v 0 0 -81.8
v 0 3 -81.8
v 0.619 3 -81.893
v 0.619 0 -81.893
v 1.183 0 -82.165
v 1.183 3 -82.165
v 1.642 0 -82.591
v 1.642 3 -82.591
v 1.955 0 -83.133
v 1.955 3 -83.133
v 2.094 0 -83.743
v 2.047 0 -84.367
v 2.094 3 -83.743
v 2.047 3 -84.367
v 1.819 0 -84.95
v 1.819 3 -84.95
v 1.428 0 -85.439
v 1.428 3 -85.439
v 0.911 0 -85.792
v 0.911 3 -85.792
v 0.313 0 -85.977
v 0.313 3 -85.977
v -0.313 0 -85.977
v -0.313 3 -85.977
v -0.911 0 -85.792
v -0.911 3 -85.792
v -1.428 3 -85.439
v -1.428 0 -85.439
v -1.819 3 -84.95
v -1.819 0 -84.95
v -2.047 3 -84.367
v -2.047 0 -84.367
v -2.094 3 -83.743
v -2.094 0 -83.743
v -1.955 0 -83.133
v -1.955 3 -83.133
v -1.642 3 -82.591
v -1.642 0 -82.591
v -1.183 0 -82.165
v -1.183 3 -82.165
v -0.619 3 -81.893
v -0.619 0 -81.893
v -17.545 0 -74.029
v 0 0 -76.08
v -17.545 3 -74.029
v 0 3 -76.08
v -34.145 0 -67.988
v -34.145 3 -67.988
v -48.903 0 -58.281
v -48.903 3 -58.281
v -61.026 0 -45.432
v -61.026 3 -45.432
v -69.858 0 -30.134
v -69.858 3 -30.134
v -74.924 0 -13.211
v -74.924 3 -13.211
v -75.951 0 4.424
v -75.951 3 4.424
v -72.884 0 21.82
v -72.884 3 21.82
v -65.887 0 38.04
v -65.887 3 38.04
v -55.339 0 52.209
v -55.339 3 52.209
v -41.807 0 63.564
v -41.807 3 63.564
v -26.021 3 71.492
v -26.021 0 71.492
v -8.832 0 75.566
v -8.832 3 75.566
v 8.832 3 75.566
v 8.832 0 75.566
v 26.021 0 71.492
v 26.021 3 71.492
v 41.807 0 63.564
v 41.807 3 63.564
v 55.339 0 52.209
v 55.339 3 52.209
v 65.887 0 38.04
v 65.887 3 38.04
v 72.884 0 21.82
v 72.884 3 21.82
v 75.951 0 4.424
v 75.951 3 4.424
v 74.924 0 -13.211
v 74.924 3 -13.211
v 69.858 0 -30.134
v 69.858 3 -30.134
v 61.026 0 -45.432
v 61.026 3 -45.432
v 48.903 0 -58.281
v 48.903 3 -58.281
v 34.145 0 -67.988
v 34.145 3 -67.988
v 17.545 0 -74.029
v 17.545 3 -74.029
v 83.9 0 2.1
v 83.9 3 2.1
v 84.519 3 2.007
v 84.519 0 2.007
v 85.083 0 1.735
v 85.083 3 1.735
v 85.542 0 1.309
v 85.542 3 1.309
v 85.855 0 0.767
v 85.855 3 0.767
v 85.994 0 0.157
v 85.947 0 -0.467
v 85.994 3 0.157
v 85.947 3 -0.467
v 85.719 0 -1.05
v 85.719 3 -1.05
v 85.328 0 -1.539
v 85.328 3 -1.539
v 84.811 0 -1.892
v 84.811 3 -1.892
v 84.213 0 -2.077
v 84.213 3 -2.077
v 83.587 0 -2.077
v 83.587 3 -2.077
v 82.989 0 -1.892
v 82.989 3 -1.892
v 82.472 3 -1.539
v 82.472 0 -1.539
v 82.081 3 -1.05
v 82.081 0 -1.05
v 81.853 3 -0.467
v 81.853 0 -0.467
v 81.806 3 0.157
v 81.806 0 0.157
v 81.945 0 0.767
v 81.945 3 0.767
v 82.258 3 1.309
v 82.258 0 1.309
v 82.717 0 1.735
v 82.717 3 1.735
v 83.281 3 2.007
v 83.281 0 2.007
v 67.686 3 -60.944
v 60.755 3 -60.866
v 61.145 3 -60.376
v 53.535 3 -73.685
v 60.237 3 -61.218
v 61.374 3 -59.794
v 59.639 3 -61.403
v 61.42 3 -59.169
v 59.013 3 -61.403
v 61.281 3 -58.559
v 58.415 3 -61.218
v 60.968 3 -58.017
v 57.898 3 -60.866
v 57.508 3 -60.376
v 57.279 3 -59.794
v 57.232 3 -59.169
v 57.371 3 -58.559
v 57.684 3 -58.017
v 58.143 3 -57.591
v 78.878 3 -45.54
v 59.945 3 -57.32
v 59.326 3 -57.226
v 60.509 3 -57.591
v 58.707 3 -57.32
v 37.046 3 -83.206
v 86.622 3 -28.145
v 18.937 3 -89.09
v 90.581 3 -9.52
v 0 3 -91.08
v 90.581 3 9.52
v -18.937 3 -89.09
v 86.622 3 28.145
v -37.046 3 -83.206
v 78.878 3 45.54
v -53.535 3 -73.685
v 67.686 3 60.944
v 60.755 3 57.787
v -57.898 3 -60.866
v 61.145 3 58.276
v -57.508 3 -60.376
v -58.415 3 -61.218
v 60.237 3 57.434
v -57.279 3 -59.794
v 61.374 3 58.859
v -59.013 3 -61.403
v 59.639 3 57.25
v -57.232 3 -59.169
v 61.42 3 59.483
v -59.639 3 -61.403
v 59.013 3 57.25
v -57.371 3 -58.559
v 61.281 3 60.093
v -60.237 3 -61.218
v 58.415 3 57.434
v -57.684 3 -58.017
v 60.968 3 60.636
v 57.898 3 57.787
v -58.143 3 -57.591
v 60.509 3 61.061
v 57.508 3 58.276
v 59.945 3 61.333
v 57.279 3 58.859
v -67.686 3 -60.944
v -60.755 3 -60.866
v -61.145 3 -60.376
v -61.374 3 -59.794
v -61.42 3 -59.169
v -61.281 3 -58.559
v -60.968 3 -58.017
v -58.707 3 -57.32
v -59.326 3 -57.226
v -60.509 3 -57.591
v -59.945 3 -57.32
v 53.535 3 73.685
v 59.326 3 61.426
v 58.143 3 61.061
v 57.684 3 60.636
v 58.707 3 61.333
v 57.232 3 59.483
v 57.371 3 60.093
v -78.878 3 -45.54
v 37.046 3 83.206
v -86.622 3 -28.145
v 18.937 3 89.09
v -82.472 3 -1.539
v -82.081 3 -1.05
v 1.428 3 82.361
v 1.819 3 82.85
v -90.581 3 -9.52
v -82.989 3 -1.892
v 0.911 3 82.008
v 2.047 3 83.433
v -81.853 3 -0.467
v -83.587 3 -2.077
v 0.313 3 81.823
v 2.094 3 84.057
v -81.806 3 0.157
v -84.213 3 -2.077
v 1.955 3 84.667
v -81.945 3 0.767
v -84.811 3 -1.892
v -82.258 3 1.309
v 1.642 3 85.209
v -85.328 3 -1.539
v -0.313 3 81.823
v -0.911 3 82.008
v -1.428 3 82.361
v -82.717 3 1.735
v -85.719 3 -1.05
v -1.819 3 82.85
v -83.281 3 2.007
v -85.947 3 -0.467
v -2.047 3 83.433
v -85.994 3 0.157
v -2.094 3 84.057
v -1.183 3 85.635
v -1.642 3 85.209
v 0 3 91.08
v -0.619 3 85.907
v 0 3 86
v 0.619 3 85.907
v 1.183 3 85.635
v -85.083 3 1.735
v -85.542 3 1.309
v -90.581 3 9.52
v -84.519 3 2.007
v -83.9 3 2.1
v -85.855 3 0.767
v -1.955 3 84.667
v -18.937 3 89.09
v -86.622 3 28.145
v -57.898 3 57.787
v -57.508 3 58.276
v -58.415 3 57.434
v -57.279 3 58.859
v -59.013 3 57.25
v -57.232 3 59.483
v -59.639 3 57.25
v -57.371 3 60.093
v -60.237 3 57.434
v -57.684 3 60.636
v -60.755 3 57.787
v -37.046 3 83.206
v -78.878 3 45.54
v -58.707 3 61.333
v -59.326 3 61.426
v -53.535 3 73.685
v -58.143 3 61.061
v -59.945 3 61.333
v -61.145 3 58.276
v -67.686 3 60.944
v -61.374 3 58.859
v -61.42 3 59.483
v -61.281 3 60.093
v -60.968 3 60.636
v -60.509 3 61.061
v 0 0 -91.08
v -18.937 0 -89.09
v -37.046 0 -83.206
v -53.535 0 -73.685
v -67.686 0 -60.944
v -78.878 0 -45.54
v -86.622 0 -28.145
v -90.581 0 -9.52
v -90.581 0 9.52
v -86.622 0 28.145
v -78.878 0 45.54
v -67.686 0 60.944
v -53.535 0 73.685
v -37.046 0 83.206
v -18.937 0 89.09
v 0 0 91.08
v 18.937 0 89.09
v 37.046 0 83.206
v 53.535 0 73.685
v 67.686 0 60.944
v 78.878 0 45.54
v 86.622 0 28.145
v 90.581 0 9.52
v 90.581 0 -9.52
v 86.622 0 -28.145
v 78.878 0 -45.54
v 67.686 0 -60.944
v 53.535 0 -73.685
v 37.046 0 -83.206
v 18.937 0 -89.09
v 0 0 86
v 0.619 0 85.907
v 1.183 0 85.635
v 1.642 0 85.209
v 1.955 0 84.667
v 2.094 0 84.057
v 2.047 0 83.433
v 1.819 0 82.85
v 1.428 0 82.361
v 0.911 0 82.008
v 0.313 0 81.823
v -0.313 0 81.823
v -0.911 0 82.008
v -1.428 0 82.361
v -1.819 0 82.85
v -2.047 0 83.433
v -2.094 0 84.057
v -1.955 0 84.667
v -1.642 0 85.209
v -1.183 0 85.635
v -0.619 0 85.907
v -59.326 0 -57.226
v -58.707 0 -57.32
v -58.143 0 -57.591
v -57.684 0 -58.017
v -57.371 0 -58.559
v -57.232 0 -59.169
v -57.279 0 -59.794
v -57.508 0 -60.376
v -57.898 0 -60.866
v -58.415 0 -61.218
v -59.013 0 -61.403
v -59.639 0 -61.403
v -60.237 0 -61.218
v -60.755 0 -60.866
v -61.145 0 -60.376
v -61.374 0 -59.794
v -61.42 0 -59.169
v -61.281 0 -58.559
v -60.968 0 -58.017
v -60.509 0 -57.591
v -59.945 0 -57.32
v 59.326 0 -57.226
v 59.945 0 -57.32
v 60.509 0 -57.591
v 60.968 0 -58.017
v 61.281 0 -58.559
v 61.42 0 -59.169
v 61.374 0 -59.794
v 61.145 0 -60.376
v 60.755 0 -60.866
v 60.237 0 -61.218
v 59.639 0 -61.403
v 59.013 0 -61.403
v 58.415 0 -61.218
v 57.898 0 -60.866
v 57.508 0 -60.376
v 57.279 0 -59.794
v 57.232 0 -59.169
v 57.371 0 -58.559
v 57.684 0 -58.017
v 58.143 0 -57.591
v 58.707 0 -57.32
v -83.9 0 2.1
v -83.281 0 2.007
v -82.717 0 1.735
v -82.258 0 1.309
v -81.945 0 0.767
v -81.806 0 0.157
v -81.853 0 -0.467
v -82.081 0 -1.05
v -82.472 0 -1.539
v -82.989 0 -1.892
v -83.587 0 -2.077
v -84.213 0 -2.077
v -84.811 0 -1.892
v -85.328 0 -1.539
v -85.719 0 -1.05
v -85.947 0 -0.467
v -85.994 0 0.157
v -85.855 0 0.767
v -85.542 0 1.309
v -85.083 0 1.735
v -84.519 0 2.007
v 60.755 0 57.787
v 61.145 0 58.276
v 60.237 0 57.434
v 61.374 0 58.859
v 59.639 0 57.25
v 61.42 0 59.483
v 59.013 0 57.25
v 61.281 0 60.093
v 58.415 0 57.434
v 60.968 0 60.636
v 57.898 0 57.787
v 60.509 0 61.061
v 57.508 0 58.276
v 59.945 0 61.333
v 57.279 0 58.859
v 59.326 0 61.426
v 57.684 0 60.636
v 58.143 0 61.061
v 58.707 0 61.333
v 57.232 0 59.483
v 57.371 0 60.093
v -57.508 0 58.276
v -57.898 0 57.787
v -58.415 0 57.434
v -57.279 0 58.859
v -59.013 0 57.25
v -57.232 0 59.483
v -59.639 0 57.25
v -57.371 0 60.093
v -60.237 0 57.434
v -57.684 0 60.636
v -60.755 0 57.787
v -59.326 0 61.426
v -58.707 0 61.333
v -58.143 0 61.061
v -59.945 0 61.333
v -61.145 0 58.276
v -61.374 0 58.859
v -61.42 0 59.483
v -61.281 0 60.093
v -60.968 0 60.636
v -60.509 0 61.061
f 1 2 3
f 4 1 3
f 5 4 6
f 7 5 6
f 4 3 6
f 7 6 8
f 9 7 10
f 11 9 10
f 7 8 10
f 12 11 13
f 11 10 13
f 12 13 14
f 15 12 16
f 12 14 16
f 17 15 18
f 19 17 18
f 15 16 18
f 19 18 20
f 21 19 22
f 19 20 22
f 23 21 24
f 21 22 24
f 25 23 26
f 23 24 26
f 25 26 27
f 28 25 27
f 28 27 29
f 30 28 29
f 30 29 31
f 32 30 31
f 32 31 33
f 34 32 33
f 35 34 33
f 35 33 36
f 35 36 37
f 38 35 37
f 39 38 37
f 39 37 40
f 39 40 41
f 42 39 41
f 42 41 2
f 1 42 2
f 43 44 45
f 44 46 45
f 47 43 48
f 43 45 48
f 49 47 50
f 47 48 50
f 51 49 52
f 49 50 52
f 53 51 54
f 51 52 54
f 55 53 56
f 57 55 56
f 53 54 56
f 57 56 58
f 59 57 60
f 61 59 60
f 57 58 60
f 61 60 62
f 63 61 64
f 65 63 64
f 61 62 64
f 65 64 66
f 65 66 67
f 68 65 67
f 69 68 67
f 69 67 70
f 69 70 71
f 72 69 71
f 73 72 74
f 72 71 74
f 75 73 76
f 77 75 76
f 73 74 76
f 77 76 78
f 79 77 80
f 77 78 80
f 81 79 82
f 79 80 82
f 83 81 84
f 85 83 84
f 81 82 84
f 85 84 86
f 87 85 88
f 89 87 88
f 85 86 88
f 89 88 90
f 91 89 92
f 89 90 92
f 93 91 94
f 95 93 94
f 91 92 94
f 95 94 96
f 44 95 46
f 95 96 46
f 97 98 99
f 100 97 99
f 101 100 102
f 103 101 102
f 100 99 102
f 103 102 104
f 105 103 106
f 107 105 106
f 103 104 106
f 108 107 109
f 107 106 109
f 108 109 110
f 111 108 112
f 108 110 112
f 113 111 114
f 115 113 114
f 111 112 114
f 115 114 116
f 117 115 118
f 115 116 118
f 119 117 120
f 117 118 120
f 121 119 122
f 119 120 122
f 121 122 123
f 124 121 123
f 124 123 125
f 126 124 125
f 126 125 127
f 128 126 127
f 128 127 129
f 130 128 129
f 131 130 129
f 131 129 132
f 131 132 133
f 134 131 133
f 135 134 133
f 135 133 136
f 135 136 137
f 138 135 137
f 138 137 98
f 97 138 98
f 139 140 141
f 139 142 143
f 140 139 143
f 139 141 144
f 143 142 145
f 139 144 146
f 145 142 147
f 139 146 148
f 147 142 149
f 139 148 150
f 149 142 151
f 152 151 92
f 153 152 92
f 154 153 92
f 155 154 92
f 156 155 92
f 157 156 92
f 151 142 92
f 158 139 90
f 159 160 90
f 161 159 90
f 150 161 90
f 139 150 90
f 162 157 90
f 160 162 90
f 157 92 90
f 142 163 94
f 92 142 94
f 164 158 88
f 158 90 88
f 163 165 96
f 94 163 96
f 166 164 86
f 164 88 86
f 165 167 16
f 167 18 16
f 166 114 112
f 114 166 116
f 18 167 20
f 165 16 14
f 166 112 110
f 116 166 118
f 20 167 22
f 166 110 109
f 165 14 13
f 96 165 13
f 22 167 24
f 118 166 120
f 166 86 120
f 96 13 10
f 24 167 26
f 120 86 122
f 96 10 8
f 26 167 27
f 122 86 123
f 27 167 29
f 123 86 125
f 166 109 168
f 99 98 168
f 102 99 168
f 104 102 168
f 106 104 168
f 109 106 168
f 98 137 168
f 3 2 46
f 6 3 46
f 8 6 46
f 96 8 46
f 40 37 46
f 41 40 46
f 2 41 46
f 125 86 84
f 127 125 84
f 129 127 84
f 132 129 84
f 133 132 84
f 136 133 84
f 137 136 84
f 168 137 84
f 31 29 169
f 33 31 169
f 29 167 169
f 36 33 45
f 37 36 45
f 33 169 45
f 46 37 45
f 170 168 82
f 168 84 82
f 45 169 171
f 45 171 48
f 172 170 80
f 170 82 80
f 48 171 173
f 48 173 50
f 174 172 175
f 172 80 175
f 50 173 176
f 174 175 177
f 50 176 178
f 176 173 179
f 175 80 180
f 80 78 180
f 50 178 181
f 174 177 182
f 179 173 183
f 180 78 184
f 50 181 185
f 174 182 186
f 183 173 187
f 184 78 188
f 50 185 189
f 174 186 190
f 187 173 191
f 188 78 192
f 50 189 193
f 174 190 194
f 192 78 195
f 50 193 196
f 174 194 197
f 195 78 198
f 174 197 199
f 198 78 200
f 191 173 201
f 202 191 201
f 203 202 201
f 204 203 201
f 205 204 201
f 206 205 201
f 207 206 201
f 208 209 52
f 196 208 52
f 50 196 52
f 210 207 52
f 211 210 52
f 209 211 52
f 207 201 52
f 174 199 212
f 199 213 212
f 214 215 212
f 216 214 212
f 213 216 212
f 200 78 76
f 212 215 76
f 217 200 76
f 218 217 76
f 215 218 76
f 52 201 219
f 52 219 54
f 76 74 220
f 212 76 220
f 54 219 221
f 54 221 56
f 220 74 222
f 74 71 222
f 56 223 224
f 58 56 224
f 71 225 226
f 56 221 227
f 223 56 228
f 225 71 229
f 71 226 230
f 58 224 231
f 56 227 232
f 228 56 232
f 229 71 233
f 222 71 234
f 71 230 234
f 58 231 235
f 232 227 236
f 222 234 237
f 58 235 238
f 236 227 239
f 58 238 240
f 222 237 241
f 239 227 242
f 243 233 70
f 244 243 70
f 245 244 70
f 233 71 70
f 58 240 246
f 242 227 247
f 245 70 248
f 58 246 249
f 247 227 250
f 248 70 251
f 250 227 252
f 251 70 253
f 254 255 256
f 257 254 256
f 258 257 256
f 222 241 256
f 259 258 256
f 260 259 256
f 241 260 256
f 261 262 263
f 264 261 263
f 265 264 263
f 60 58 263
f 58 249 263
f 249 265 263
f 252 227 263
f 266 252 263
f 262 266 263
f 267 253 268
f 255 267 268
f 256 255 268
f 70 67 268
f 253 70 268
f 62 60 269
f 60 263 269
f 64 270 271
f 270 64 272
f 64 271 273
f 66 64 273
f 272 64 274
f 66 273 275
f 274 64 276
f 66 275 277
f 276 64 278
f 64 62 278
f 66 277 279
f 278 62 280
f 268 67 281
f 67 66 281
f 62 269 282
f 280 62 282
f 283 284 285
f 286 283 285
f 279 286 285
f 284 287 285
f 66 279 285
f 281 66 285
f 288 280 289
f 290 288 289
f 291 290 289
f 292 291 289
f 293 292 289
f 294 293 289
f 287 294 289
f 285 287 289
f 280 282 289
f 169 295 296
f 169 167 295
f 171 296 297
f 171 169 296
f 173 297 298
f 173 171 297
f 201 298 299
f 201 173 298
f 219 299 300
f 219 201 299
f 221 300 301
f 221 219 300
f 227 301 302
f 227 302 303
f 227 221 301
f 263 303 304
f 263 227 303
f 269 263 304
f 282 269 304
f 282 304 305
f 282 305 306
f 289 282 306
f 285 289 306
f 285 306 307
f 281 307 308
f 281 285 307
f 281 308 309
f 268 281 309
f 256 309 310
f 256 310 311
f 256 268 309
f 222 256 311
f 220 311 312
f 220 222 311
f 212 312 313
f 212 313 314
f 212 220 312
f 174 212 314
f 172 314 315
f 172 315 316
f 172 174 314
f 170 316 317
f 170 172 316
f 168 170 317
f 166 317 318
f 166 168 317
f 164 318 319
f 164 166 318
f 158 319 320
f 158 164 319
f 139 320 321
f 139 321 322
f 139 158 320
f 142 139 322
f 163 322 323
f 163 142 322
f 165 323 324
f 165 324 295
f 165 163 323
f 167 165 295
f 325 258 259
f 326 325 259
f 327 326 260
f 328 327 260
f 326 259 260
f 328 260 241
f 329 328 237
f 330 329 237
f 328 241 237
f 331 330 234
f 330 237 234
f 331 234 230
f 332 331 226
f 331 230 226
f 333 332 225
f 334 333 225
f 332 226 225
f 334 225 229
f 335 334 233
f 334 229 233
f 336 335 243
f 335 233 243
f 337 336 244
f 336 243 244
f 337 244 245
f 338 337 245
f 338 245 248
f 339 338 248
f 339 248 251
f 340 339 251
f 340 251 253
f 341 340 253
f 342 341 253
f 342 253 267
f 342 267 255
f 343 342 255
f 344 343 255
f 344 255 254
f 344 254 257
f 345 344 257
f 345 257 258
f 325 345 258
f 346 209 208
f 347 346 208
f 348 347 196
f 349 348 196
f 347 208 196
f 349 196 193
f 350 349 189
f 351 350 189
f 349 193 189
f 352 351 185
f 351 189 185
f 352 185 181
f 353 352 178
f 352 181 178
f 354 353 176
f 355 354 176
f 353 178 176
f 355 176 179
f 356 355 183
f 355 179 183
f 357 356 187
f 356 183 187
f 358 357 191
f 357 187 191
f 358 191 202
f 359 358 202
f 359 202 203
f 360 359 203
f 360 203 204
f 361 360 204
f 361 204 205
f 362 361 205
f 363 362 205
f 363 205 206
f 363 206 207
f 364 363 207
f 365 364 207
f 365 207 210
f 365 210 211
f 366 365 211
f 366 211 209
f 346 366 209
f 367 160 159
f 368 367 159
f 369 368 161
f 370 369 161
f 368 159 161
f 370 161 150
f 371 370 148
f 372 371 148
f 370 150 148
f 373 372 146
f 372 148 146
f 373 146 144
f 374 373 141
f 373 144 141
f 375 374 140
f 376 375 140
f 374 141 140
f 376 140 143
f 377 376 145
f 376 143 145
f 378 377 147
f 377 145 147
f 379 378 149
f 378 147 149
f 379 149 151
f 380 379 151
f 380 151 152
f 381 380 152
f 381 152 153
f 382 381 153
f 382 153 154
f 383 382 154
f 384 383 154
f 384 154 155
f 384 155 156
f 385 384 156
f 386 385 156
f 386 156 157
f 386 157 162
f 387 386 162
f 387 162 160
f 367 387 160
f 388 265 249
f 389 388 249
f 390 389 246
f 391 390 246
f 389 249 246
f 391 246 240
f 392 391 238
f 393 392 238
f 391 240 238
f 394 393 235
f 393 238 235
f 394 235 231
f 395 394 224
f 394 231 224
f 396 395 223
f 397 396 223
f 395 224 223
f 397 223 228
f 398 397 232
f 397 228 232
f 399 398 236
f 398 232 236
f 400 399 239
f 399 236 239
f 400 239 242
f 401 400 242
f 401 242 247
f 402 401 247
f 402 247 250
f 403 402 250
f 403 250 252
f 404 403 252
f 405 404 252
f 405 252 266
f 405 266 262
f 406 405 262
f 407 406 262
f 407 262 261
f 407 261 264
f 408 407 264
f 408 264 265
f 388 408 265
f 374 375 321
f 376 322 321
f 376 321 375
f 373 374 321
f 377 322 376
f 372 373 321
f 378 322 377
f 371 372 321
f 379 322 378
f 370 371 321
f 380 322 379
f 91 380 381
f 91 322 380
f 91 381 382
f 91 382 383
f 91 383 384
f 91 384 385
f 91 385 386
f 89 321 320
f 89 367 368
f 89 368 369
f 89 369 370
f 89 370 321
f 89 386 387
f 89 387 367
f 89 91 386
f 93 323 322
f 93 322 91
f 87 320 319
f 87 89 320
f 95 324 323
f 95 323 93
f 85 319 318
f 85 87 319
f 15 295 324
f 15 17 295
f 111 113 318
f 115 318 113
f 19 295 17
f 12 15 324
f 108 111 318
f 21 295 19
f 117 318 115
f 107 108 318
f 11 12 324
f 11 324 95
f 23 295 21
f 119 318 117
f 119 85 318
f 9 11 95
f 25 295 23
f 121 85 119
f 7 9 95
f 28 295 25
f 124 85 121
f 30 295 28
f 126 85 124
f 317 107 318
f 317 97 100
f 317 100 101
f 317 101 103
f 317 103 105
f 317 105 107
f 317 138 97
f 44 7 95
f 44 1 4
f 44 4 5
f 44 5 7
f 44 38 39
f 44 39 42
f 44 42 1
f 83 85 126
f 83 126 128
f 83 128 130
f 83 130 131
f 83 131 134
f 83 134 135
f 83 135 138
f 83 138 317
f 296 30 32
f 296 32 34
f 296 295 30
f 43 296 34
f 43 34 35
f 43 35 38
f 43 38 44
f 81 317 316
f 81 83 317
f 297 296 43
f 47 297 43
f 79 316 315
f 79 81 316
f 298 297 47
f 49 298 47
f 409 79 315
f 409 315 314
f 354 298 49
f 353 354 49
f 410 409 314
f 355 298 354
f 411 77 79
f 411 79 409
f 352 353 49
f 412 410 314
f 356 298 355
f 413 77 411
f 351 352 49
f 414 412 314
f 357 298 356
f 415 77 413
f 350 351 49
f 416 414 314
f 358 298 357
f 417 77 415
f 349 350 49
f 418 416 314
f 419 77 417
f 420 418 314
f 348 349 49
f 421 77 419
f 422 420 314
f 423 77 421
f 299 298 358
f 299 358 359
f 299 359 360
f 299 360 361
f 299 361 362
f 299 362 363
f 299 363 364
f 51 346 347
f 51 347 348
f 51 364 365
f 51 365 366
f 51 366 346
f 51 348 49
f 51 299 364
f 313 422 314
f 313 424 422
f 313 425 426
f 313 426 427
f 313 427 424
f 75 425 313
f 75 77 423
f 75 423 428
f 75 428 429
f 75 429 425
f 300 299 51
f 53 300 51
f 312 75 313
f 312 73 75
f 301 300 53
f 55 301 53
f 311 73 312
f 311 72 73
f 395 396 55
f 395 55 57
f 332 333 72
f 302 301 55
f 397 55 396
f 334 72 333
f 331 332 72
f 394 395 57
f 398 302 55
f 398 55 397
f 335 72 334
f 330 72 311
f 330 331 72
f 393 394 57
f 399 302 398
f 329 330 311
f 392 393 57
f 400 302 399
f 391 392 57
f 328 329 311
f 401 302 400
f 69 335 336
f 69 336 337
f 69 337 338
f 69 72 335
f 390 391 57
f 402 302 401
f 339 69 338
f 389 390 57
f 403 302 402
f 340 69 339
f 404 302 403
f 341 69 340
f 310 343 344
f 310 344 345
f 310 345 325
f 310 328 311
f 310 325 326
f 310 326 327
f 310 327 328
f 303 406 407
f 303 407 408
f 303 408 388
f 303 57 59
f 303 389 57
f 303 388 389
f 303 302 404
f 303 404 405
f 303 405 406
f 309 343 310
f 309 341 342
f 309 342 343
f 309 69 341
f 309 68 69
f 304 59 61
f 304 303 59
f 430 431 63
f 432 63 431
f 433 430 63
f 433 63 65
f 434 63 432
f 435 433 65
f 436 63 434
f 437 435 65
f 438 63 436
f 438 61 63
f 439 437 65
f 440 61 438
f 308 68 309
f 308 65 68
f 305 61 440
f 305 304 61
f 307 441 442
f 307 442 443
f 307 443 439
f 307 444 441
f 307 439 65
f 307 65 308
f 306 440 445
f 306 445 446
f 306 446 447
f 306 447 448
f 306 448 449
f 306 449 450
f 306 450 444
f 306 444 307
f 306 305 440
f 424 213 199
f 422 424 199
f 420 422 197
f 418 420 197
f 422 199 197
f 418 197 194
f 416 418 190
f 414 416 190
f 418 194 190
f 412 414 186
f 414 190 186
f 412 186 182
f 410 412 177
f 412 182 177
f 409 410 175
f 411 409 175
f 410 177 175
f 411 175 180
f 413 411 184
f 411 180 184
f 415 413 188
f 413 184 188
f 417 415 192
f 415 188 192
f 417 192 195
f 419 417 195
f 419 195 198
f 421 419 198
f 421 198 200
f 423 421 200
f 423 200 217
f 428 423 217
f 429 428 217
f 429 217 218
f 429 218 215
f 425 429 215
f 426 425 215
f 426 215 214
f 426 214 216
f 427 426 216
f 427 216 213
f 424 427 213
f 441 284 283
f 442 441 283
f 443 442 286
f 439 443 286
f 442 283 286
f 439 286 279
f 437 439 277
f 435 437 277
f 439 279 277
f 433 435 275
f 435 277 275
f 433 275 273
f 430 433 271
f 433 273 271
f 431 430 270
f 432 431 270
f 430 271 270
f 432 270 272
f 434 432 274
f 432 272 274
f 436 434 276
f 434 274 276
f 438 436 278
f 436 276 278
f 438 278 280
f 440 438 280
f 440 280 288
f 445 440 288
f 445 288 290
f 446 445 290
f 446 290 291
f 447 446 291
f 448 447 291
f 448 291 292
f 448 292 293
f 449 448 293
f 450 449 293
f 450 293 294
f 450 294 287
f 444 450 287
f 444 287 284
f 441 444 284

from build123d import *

# Parameters (mm, degrees)
SKETCH_1_W          = 15
SKETCH_1_H          = 3
SKETCH_2_R          = 2.1
CUT_EXTRUDE_1_DEPTH = 10


with BuildPart() as part:
    # 草图1 → 旋转1 (revolve)
    with BuildSketch(Plane.XY, mode=Mode.PRIVATE) as revolve_1_sk:
        with Locations((83.58, 1.5)):
            Rectangle(SKETCH_1_W, SKETCH_1_H)
    revolve(revolve_1_sk.sketch.rotate(Axis((0, 0, 0), (0, 1, 0)), 90), axis=Axis((0, 0, 0), (0, 1, 0)))

    # 草图2 → 切除-拉伸1 (cut)
    with BuildSketch(Plane(origin=(0, 3, 0), x_dir=(1, 0, 0), z_dir=(0, 1, 0))):
        with Locations(Location((-83.9, 0, 0), (0, 0, 270))):
            Circle(SKETCH_2_R)
        with Locations(Location((-59.326258942, 59.326258942, 0), (0, 0, 270))):
            Circle(SKETCH_2_R)
        with Locations(Location((0, 83.9, 0), (0, 0, 270))):
            Circle(SKETCH_2_R)
        with Locations(Location((59.326258942, 59.326258942, 0), (0, 0, 270))):
            Circle(SKETCH_2_R)
        with Locations(Location((83.9, 0, 0), (0, 0, 270))):
            Circle(SKETCH_2_R)
        with Locations(Location((59.326258942, -59.326258942, 0), (0, 0, 270))):
            Circle(SKETCH_2_R)
        with Locations(Location((0, -83.9, 0), (0, 0, 270))):
            Circle(SKETCH_2_R)
        with Locations(Location((-59.326258942, -59.326258942, 0), (0, 0, 270))):
            Circle(SKETCH_2_R)
    extrude(amount=-CUT_EXTRUDE_1_DEPTH, mode=Mode.SUBTRACT)


solid = part.part
